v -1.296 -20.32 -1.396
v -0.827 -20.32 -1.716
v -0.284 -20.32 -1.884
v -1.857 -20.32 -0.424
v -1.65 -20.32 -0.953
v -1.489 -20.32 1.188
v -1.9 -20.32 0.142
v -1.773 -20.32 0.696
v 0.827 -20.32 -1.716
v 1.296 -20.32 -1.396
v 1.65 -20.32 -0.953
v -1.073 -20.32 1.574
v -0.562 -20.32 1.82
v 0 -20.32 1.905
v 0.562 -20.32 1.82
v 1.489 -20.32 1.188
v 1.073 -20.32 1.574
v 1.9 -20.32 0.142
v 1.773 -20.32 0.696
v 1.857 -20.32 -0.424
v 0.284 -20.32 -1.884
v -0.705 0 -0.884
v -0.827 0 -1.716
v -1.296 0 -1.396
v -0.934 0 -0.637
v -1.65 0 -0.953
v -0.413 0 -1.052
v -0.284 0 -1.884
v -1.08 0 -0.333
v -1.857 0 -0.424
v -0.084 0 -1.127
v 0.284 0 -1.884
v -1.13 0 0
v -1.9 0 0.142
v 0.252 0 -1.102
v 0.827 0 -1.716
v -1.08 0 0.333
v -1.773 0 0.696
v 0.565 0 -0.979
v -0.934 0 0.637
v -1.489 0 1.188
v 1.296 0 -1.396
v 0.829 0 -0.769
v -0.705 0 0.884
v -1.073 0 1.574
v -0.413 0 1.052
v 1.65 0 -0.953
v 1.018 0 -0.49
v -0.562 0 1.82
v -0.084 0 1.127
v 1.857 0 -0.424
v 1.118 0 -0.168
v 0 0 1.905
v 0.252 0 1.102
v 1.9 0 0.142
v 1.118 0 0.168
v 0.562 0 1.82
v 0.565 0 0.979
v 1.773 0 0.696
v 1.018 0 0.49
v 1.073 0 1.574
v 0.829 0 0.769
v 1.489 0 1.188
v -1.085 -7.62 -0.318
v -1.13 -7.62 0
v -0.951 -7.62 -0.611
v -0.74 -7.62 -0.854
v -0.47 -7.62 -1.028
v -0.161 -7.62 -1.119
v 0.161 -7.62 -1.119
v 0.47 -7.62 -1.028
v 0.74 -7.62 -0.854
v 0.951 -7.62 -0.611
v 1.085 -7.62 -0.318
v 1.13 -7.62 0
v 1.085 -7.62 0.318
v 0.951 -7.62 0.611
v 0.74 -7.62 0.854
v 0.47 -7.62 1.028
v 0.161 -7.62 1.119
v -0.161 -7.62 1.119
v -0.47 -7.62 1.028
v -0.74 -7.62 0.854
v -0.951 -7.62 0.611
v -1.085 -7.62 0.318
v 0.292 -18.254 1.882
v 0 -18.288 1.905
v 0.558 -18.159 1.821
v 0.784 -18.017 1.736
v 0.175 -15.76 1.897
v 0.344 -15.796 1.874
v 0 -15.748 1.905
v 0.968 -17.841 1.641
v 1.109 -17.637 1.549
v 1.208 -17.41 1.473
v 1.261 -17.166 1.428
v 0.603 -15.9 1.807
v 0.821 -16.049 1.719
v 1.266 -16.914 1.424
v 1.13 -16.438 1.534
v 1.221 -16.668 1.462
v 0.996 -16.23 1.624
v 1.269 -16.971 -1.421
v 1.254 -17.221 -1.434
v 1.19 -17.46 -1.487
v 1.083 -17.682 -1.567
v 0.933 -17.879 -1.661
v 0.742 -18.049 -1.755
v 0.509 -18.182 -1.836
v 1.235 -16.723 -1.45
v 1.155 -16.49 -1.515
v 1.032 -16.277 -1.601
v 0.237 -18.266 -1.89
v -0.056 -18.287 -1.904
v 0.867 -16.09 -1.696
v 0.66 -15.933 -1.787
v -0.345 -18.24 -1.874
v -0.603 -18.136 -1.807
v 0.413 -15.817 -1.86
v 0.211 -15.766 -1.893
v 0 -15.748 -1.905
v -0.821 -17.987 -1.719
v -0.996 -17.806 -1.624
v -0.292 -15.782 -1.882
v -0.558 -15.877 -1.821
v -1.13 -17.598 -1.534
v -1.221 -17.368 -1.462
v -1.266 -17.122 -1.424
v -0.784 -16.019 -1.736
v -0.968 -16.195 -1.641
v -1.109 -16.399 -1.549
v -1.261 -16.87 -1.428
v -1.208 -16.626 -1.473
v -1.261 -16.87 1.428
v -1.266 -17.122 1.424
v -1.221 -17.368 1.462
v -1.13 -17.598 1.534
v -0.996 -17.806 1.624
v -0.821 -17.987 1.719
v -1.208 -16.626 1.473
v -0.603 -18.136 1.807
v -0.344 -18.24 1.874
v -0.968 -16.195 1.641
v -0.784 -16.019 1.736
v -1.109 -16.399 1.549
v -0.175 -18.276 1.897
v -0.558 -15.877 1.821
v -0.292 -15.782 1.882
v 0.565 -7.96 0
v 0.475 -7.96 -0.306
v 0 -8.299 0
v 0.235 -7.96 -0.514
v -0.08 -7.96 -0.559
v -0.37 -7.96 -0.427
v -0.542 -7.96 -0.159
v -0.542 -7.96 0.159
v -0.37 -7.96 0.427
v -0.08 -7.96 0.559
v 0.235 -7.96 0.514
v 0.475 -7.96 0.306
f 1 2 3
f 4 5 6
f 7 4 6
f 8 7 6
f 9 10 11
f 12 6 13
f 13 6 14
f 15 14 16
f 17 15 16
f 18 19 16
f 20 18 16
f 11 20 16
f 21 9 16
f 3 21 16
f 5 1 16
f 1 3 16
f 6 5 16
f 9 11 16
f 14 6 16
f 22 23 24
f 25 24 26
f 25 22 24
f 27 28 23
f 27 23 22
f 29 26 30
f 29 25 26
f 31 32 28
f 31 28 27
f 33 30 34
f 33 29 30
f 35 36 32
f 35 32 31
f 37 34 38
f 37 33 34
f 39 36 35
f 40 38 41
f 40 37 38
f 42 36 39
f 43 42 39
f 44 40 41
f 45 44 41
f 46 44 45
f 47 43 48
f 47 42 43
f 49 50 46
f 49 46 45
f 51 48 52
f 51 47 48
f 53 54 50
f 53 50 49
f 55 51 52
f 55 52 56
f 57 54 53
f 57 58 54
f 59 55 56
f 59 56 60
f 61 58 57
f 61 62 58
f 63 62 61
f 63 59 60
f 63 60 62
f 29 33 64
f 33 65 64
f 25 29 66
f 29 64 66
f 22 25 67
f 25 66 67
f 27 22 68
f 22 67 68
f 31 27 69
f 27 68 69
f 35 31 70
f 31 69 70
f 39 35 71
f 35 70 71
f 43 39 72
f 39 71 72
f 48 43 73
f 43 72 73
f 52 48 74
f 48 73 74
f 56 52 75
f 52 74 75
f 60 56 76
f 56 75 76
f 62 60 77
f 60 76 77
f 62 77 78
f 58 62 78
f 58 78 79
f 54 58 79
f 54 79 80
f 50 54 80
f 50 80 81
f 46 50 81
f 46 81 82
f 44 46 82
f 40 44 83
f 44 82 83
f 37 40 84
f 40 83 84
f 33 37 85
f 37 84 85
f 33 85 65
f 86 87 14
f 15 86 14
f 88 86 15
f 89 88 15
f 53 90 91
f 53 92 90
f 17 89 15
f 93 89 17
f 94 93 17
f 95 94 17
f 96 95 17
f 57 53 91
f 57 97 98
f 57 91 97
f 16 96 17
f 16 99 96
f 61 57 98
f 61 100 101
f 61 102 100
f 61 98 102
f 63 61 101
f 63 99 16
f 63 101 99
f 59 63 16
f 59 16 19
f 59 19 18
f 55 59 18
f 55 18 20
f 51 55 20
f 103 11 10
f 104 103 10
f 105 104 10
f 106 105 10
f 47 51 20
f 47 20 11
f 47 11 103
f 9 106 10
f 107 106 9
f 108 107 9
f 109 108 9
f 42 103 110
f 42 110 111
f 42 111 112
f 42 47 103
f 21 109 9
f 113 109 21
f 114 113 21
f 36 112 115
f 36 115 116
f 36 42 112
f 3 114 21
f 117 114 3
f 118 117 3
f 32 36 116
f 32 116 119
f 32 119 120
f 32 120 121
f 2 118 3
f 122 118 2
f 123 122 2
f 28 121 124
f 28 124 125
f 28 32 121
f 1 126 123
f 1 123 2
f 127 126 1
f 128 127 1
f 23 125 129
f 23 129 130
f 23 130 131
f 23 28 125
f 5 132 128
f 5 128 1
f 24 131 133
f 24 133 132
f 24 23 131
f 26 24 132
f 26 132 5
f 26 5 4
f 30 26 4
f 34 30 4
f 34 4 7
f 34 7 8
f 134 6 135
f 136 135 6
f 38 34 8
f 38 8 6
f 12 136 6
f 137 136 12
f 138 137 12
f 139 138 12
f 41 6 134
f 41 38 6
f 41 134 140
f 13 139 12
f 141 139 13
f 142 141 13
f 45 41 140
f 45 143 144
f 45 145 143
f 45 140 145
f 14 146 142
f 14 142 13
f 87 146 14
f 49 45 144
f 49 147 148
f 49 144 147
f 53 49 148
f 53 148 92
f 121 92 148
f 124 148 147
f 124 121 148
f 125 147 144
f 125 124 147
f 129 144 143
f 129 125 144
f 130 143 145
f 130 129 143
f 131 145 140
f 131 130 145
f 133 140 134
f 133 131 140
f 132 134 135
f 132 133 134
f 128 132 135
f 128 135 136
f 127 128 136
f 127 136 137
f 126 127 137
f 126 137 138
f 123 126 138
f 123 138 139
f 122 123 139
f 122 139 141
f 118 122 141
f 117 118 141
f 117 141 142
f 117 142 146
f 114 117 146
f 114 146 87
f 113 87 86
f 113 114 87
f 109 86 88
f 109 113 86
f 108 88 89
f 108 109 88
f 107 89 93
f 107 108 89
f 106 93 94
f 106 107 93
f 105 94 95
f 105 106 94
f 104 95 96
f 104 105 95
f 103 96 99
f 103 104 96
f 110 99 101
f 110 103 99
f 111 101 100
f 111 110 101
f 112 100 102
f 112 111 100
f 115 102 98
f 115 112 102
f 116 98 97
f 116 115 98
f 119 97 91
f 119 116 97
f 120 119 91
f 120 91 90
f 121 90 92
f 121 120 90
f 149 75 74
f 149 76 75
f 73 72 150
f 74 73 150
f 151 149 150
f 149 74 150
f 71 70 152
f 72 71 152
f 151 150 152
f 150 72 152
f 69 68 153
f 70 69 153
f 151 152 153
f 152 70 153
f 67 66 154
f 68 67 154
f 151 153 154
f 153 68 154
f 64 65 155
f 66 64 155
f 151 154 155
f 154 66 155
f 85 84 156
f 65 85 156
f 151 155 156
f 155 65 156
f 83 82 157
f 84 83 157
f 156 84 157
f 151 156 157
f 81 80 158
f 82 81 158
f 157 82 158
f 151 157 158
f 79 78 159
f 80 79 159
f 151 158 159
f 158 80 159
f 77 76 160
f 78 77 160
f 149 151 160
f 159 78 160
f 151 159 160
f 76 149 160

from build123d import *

# Parameters (mm, degrees)
SKETCH1_R                 = 1.905
BOSS_EXTRUDE1_DEPTH       = 20.32
F_4_40_TAPPED_HOLE1_D     = 2.2606
F_4_40_TAPPED_HOLE1_DEPTH = 7.62
F_4_40_TAPPED_HOLE1_TIP   = 0.679152758
CUT_EXTRUDE1_DEPTH        = 21.497815737
CUT_EXTRUDE1_DEPTH_BACK   = 21.497815737
SKETCH4_R                 = 1.27


with BuildPart() as part:
    # Sketch1 → Boss-Extrude1 (new body)
    with BuildSketch(Plane(origin=(0, 0, 0), x_dir=(1, 0, 0), z_dir=(0, 1, 0))):
        with Locations(Location((0, 0, 0), (0, 0, 270))):
            Circle(SKETCH1_R)
    extrude(amount=-BOSS_EXTRUDE1_DEPTH)

    # #4-40 Tapped Hole1
    with Locations(Plane(origin=(0, 0, 0), x_dir=(1, 0, 0), z_dir=(0, 1, 0))):
        with Locations((0, 0)):
            Hole(F_4_40_TAPPED_HOLE1_D / 2, depth=F_4_40_TAPPED_HOLE1_DEPTH)
            with Locations((0, 0, -(F_4_40_TAPPED_HOLE1_DEPTH + F_4_40_TAPPED_HOLE1_TIP / 2))):  # 118° drill point
                Cone(0, F_4_40_TAPPED_HOLE1_D / 2, F_4_40_TAPPED_HOLE1_TIP, mode=Mode.SUBTRACT)

    # Sketch4 → Cut-Extrude1 (cut, two sides: drawn at the far end of the back side and taken through both)
    with BuildSketch(Plane.XY.offset(-CUT_EXTRUDE1_DEPTH_BACK)):
        with Locations(Location((0, -17.018, 0), (0, 0, 90.000000002))):
            Circle(SKETCH4_R)
    extrude(amount=CUT_EXTRUDE1_DEPTH + CUT_EXTRUDE1_DEPTH_BACK, mode=Mode.SUBTRACT)


solid = part.part
